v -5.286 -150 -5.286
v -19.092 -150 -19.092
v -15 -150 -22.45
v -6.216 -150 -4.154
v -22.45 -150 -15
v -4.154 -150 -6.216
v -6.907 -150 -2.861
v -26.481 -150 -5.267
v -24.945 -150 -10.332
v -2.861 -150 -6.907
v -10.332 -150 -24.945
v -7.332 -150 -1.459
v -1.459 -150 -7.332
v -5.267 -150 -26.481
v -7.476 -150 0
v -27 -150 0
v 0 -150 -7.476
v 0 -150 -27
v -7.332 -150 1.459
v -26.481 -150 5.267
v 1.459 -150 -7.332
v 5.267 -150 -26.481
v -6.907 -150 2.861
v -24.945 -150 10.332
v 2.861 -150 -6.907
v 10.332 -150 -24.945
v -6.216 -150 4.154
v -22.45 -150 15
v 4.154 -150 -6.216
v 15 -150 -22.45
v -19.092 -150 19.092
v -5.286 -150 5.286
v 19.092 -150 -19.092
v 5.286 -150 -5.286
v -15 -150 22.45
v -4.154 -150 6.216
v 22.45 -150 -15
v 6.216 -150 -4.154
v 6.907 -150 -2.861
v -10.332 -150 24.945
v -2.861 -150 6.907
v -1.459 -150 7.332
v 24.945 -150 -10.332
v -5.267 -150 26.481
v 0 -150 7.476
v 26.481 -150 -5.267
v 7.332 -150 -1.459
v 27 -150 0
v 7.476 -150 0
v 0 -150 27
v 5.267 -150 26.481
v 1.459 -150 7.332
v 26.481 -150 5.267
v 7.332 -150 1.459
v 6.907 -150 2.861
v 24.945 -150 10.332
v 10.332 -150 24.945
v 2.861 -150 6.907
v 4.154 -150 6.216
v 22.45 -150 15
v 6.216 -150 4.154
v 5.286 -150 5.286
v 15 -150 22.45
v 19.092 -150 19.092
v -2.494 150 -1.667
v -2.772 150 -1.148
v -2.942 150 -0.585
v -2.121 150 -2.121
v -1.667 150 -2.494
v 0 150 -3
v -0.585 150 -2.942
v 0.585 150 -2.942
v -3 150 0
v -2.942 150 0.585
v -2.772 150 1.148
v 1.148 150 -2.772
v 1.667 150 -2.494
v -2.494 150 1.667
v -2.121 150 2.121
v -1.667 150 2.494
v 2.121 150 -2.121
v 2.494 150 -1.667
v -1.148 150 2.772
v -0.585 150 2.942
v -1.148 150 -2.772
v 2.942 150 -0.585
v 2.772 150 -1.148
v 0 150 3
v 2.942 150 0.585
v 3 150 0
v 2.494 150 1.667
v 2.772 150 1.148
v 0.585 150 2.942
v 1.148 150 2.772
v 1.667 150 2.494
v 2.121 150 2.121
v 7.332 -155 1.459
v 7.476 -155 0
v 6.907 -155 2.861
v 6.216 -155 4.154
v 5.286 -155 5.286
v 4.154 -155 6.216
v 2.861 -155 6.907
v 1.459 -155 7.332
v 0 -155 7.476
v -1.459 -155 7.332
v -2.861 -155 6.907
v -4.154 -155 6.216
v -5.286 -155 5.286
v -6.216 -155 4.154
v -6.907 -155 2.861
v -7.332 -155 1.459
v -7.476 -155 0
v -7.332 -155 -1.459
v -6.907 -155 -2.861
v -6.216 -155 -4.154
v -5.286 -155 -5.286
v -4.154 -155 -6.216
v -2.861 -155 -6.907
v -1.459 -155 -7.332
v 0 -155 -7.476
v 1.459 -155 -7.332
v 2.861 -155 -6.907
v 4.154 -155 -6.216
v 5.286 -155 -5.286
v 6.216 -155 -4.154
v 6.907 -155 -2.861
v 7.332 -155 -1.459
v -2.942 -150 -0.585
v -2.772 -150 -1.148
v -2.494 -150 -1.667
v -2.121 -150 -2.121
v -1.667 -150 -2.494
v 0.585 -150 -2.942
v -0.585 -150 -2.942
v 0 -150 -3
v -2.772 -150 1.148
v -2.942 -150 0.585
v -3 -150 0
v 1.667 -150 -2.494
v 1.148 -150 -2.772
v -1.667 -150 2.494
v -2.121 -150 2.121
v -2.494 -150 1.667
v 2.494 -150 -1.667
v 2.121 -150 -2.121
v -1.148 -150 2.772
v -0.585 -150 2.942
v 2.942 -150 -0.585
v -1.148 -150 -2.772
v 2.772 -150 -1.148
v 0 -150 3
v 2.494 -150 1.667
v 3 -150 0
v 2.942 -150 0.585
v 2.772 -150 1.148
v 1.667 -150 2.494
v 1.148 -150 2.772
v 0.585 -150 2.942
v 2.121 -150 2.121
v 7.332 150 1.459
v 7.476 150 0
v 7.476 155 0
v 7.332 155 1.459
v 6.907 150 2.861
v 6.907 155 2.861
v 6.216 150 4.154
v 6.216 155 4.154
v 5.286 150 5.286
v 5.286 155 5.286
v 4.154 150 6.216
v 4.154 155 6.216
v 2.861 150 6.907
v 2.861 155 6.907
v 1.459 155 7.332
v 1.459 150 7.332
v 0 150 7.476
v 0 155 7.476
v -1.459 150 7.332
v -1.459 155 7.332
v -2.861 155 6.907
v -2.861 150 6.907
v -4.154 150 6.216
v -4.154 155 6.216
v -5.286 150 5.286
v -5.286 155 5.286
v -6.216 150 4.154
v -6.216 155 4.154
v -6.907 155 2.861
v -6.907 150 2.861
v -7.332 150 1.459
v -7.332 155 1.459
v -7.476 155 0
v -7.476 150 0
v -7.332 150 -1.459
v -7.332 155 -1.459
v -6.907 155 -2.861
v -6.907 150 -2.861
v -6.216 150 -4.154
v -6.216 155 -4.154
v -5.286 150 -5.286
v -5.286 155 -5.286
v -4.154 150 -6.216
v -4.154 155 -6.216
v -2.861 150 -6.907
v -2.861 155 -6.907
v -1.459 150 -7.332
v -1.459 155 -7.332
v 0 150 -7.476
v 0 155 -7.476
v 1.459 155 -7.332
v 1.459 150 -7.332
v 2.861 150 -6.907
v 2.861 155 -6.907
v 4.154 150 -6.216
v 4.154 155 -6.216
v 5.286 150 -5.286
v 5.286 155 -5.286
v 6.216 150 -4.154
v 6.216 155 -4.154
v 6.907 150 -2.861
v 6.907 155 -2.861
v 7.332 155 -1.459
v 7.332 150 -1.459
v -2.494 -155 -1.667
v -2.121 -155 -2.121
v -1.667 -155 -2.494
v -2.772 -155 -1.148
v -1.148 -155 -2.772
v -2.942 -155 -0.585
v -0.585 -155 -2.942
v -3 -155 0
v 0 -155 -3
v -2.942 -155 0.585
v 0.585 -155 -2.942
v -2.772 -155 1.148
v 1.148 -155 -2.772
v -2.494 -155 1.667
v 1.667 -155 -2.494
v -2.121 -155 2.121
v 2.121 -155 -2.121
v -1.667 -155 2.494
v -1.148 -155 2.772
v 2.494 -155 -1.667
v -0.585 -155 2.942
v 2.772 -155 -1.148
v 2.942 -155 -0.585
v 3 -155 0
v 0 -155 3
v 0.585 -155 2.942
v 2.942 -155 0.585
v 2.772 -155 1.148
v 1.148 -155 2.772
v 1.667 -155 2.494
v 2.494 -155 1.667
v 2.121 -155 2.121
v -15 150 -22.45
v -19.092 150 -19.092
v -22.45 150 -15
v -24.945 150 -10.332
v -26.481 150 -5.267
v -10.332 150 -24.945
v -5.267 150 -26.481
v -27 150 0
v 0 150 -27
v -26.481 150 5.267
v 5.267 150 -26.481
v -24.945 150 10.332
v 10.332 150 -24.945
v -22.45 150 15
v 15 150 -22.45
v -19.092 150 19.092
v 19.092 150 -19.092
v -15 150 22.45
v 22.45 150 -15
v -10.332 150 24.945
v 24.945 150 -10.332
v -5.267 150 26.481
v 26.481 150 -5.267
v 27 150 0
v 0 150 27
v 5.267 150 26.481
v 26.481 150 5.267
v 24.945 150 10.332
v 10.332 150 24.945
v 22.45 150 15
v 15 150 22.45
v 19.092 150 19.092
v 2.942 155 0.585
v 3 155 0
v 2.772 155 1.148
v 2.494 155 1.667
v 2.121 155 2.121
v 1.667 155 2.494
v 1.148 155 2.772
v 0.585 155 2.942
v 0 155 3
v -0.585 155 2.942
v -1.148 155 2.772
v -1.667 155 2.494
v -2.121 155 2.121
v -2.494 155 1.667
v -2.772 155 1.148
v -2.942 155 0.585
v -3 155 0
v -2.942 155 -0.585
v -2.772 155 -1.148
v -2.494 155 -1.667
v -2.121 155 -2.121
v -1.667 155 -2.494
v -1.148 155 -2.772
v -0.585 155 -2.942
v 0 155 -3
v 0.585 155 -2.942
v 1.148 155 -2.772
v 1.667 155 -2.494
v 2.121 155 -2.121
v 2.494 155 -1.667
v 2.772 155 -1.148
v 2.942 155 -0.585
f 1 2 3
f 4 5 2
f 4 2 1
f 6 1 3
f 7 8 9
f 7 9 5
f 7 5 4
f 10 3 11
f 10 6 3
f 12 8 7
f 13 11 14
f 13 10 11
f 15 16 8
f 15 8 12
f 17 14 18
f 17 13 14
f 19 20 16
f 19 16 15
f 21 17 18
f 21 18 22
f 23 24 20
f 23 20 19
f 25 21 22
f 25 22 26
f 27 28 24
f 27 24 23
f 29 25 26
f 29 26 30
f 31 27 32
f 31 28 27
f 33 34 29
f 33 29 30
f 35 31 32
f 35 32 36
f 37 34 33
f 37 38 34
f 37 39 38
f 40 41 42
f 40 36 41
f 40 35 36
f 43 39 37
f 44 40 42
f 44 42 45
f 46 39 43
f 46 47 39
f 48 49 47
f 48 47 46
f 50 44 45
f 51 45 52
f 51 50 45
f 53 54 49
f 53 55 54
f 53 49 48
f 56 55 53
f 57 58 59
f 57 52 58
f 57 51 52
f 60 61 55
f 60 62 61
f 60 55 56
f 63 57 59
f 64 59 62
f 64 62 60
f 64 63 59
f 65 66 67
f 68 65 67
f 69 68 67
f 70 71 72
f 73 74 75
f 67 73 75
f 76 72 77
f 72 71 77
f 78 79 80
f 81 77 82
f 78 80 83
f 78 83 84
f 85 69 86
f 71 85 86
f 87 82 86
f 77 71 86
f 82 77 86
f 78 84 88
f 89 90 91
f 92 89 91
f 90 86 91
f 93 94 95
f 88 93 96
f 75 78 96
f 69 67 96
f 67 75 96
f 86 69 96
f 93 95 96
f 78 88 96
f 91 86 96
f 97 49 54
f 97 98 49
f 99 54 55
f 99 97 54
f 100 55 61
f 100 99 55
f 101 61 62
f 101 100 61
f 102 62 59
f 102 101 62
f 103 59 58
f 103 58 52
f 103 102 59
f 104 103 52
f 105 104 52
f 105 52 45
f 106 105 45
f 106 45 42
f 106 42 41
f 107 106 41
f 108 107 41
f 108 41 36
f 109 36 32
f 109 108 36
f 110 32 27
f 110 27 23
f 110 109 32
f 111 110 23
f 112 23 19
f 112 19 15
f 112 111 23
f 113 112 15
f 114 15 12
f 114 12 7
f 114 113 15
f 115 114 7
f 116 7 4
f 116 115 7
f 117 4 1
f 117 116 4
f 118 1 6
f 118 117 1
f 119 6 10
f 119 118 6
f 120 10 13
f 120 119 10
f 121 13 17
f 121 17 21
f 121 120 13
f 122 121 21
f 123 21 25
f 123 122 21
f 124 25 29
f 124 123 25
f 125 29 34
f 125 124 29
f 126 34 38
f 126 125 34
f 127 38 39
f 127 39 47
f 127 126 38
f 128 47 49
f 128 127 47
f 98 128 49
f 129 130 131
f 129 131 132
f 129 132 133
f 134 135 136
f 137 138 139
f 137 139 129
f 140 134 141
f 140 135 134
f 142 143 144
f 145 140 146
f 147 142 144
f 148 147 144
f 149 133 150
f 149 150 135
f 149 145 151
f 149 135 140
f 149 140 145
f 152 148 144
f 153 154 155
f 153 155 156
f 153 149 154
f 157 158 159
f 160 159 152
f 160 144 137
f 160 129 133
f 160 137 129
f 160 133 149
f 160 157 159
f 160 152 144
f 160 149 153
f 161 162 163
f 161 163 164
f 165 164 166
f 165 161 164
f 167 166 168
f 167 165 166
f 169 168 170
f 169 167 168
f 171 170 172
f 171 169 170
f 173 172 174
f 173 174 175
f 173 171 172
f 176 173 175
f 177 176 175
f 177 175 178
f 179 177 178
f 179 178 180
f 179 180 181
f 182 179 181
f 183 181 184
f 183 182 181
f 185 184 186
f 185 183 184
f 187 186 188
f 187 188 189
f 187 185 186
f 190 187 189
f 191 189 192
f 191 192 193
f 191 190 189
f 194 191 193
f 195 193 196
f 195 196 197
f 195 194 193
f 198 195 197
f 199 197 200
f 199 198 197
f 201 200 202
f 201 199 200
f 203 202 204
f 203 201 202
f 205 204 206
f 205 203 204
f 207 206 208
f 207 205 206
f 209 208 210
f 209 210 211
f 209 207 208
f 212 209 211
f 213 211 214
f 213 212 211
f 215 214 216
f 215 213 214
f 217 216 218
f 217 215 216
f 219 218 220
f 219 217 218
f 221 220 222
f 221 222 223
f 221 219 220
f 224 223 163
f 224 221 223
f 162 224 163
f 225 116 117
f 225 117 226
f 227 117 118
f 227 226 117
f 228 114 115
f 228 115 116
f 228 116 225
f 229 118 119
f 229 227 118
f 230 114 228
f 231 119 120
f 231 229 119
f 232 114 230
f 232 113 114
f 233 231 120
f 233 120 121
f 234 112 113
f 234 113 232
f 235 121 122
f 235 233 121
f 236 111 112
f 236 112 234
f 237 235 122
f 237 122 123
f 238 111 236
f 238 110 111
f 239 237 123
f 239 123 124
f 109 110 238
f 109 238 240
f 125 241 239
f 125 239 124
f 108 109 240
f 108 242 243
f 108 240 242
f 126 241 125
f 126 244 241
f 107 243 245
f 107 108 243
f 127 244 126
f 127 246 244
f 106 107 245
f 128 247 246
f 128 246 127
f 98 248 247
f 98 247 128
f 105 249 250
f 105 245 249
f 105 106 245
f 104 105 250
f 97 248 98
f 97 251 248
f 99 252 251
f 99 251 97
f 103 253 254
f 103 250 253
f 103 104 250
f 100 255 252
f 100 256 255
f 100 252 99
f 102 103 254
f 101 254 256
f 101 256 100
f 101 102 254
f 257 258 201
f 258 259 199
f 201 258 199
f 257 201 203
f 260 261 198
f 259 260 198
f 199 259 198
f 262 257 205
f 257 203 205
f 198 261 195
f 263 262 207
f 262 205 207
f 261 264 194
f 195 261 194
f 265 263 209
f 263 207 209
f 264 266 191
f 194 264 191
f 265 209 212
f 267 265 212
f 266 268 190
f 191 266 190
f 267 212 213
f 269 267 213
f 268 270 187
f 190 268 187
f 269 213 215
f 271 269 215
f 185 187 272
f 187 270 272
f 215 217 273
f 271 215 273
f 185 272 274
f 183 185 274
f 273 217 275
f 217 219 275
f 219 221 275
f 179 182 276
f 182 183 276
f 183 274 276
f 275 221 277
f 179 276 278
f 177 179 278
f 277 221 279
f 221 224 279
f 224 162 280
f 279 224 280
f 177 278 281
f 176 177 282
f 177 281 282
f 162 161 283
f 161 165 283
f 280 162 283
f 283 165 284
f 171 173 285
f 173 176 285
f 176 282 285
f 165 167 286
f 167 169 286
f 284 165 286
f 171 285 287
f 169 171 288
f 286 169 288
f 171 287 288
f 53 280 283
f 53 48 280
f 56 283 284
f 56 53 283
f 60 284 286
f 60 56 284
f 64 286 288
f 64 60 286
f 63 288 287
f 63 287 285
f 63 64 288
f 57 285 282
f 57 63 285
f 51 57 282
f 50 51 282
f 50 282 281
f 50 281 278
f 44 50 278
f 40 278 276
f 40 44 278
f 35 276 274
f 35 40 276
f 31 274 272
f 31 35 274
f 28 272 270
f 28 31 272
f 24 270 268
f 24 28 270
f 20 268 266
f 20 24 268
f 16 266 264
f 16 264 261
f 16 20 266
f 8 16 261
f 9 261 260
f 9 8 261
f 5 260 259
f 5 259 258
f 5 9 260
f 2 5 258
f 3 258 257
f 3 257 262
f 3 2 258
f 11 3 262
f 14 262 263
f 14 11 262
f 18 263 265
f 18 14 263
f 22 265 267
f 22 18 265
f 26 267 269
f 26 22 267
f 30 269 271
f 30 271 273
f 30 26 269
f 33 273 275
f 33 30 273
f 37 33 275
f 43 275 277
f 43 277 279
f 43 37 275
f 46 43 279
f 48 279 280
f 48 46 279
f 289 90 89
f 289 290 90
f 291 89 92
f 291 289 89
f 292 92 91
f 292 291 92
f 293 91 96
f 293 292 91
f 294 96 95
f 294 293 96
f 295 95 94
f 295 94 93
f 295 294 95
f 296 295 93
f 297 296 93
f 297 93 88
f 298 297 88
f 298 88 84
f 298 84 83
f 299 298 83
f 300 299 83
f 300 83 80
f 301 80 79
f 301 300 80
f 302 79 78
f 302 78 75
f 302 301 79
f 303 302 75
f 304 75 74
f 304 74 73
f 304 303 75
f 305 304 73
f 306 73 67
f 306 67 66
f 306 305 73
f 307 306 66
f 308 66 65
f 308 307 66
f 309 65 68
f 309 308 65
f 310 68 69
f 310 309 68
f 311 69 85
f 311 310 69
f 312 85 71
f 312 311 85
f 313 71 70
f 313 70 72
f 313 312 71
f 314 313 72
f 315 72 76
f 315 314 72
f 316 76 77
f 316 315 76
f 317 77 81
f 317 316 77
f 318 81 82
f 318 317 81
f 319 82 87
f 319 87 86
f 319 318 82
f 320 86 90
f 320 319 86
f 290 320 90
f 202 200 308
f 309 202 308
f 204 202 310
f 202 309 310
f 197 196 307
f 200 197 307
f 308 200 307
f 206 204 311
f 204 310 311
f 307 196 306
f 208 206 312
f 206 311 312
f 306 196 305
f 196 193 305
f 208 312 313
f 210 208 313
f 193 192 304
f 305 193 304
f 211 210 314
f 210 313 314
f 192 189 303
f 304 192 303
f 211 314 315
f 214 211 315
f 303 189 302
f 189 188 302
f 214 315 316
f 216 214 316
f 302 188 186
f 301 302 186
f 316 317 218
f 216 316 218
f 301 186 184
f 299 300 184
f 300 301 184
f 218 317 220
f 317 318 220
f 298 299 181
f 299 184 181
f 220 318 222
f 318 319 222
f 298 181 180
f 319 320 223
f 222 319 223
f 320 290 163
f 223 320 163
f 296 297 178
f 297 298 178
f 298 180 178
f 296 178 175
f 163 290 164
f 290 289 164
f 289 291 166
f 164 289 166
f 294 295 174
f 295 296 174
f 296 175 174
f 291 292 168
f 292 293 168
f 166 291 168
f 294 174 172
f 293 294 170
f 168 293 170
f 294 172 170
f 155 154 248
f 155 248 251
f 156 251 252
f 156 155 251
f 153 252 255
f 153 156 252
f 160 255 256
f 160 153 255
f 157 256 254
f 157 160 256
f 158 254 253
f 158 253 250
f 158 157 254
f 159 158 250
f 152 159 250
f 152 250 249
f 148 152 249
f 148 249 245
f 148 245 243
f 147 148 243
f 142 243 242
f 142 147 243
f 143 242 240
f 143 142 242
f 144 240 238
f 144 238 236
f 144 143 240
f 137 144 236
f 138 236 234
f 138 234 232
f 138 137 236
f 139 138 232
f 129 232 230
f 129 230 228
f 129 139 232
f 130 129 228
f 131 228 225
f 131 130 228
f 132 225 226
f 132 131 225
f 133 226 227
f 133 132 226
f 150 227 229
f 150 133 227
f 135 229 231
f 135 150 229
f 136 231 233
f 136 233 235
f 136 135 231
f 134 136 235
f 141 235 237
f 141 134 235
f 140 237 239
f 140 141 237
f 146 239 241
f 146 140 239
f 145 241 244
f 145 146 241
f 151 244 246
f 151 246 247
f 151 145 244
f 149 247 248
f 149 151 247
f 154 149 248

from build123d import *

# Parameters (mm, degrees)
F0_R     = 3
F1_DEPTH = 150
F0_R_2   = 7.4761454261
F2_DEPTH = 155
F0_R_3   = 27
F3_DEPTH = 150


with BuildPart() as f1:
    # F0 (on Front) → F1 (new body, symmetric)
    with BuildSketch(Plane.XZ):
        Circle(F0_R)
    extrude(amount=F1_DEPTH, both=True)

    # F0 (on Front) → F2 (join, symmetric)
    with BuildSketch(Plane.XZ):
        Circle(F0_R_2)
        Circle(F0_R, mode=Mode.SUBTRACT)
    extrude(amount=F2_DEPTH, both=True)

    # F0 (on Front) → F3 (join, symmetric)
    with BuildSketch(Plane.XZ):
        Circle(F0_R_3)
        Circle(F0_R_2, mode=Mode.SUBTRACT)
    extrude(amount=F3_DEPTH, both=True)


solid = f1.part
